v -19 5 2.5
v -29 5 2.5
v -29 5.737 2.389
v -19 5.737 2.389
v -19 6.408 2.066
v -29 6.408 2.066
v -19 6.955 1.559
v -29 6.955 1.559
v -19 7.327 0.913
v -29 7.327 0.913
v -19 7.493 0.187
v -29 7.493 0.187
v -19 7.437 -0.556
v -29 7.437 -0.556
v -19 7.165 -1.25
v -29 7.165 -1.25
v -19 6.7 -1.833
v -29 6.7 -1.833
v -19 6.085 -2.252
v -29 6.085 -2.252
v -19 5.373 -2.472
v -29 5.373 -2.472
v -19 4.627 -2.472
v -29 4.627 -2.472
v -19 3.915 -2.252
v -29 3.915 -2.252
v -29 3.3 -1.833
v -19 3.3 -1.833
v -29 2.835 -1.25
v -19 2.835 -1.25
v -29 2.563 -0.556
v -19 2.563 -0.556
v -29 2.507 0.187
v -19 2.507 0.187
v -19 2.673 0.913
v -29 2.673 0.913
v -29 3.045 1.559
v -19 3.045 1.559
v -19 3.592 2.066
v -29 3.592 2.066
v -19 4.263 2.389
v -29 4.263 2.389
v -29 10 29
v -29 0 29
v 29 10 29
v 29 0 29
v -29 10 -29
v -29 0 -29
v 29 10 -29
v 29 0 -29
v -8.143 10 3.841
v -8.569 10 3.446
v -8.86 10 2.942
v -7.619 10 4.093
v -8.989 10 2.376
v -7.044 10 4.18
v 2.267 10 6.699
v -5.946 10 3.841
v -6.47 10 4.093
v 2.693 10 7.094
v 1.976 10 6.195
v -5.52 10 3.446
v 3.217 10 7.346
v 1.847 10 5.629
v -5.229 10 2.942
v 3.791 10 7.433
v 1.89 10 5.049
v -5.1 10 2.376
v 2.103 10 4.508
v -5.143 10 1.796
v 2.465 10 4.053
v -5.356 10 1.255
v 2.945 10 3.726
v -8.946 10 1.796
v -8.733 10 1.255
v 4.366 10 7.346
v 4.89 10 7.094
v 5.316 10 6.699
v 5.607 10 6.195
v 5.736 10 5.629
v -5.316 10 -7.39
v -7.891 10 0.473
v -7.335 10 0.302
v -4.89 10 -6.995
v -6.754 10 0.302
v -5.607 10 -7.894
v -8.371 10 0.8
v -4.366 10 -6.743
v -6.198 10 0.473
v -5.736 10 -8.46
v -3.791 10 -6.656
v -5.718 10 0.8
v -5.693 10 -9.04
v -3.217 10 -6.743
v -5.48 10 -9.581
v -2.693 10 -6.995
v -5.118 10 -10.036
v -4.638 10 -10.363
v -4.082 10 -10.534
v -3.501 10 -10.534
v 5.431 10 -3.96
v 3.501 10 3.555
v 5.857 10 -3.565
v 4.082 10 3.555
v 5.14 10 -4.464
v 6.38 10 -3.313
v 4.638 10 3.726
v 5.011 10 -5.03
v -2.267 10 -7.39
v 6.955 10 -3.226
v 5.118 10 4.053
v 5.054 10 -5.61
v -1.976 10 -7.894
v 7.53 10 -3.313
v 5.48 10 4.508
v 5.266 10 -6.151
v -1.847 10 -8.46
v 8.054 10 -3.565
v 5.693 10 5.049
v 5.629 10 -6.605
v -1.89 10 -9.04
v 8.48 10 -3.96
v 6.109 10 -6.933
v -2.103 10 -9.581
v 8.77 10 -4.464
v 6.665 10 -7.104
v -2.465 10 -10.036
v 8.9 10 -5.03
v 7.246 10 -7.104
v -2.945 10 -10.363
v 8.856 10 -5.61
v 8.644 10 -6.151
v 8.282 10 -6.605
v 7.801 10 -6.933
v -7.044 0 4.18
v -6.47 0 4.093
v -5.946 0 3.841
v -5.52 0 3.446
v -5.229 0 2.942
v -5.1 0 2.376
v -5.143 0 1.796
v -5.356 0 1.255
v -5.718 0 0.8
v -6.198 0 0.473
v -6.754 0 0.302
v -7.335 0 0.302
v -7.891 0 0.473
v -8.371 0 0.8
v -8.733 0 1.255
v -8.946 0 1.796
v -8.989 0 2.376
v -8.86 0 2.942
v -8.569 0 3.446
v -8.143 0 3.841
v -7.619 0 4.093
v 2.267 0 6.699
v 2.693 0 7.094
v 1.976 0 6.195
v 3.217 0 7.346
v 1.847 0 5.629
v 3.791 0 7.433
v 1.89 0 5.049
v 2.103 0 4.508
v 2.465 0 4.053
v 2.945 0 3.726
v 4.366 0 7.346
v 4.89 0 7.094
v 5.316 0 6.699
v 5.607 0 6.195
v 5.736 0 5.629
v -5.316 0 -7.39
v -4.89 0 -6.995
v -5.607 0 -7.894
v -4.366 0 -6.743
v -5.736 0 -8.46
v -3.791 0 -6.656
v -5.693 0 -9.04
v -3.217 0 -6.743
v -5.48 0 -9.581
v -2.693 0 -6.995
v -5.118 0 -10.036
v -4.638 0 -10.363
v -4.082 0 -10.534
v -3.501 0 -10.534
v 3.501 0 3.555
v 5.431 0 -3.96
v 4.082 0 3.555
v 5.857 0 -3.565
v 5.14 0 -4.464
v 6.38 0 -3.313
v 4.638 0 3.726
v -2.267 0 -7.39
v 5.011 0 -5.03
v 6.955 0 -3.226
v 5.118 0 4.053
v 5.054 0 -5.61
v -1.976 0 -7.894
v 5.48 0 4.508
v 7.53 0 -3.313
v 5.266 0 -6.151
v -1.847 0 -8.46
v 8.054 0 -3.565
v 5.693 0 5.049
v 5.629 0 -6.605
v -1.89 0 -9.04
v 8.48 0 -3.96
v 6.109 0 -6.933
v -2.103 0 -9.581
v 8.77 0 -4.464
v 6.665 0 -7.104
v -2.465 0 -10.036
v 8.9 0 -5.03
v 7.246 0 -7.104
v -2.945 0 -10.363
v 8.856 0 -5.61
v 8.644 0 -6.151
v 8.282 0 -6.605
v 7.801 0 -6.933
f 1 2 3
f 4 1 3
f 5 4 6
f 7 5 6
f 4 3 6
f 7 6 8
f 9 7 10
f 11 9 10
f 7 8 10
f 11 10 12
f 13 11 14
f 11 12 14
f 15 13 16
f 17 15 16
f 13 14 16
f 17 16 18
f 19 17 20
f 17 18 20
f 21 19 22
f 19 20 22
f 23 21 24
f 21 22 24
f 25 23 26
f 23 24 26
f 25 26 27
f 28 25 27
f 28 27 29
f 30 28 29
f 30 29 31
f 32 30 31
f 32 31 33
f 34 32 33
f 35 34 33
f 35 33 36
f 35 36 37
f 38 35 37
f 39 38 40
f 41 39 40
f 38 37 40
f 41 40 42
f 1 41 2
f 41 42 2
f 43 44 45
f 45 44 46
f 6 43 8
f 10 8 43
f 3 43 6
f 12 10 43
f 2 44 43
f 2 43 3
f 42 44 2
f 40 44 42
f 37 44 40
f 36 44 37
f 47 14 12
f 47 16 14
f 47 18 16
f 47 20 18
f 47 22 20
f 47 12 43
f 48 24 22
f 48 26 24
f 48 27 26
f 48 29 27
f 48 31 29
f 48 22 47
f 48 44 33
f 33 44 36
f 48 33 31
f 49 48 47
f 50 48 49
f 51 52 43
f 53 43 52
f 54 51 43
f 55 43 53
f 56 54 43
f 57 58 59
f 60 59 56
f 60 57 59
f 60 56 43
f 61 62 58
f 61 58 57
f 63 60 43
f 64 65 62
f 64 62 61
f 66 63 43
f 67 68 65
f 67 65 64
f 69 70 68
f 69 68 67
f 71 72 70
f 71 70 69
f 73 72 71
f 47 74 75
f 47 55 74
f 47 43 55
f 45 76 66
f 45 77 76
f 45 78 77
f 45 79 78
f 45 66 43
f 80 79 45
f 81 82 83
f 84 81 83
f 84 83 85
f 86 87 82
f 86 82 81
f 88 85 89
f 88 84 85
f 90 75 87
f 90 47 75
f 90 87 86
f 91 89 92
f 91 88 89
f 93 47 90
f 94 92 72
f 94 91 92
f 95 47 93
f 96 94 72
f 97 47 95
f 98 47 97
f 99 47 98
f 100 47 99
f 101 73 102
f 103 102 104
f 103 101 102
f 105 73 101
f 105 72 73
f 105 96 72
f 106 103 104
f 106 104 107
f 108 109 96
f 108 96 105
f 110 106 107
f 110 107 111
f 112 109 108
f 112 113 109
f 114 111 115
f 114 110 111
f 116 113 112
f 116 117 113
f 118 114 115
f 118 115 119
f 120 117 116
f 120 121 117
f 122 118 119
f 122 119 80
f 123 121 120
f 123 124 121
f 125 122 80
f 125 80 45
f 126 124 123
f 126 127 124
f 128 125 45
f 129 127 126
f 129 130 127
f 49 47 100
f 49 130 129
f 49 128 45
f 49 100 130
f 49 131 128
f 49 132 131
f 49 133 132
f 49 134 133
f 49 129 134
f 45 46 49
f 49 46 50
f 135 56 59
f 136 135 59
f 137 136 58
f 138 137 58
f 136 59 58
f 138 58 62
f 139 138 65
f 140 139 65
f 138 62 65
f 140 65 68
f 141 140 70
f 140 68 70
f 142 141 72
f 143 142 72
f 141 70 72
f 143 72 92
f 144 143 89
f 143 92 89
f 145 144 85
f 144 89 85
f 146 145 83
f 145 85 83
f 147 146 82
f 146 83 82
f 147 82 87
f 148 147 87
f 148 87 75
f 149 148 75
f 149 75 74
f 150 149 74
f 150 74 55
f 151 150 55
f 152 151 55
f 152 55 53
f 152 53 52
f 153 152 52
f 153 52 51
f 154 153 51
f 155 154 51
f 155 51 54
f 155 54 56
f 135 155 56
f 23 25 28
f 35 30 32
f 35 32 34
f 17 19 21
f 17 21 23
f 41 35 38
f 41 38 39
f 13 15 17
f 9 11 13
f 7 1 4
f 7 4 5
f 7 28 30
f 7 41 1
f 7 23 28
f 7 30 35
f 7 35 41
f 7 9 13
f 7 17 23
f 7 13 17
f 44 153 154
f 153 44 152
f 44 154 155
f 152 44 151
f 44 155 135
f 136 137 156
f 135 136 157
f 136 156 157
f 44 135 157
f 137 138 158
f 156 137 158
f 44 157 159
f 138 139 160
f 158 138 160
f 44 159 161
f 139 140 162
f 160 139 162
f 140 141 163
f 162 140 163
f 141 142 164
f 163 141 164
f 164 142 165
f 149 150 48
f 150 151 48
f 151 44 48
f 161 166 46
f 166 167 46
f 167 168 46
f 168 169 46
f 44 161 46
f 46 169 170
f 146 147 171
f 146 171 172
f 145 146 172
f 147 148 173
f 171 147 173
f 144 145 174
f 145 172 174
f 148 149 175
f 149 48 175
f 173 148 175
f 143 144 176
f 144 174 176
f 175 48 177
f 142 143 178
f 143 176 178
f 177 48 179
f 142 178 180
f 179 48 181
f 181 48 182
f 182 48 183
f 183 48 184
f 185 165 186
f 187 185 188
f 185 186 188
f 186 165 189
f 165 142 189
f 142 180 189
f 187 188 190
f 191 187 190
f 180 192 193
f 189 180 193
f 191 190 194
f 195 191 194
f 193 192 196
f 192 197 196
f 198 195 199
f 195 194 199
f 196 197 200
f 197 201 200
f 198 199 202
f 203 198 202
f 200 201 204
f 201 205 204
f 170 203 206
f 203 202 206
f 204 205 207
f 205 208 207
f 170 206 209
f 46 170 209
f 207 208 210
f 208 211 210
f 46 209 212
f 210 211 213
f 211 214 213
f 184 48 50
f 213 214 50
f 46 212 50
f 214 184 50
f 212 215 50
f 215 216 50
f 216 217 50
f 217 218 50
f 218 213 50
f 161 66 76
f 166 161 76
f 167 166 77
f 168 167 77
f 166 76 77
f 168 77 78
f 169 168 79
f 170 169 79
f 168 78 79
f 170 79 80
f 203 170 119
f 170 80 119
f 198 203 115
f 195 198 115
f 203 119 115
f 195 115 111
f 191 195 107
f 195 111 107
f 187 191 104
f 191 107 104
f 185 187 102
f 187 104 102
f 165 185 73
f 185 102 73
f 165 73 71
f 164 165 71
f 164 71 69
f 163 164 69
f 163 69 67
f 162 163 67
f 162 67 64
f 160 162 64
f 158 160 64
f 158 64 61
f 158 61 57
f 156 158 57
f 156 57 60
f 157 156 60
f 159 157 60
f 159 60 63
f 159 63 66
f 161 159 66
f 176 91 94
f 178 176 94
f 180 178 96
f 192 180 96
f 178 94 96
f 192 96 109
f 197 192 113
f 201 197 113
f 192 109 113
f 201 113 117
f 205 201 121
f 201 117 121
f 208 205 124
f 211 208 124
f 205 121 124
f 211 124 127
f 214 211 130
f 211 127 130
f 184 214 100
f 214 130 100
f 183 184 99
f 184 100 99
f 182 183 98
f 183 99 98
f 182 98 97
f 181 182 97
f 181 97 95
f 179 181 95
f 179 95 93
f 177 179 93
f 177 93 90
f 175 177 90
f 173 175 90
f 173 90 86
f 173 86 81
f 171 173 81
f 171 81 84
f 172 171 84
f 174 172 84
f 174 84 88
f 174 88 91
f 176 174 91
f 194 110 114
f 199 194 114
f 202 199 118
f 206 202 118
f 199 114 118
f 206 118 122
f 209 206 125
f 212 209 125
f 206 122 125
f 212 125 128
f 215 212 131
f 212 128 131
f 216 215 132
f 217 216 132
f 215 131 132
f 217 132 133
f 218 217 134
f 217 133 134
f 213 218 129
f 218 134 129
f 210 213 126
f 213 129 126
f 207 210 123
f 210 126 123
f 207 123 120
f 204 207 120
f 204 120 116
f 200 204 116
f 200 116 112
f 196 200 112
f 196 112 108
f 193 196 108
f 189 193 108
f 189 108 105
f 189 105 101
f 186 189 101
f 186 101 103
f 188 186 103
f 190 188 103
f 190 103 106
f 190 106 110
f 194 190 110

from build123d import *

# Parameters (mm, degrees)
SKETCH1_W           = 58
SKETCH1_H           = 58
BOSS_EXTRUDE1_DEPTH = 10
SKETCH2_R           = 2.5
CUT_EXTRUDE1_DEPTH  = 10
SKETCH7_R           = 1.95
CUT_EXTRUDE4_DEPTH  = 43.213741838


with BuildPart() as part:
    # Sketch1 → Boss-Extrude1 (new body)
    with BuildSketch(Plane(origin=(0, 0, 0), x_dir=(1, 0, 0), z_dir=(0, 1, 0))):
        Rectangle(SKETCH1_W, SKETCH1_H)
    extrude(amount=BOSS_EXTRUDE1_DEPTH)

    # Sketch2 → Cut-Extrude1 (cut)
    with BuildSketch(Plane.ZY.offset(29)):
        with Locations((0, 5)):
            Circle(SKETCH2_R)
    extrude(amount=-CUT_EXTRUDE1_DEPTH, mode=Mode.SUBTRACT)

    # Sketch7 → Cut-Extrude4 (cut, through all)
    with BuildSketch(Plane(origin=(0, 10, 0), x_dir=(1, 0, 0), z_dir=(0, 1, 0))):
        with Locations(Location((-3.791486316, 8.606059277, 0), (0, 0, 270))):
            Circle(SKETCH7_R)
        with Locations(Location((6.955184511, 5.175961247, 0), (0, 0, 270))):
            Circle(SKETCH7_R)
        with Locations(Location((-7.044475248, -2.229902286, 0), (0, 0, 270))):
            Circle(SKETCH7_R)
        with Locations(Location((3.791486316, -5.482891218, 0), (0, 0, 270))):
            Circle(SKETCH7_R)
    extrude(amount=-CUT_EXTRUDE4_DEPTH, mode=Mode.SUBTRACT)


solid = part.part
